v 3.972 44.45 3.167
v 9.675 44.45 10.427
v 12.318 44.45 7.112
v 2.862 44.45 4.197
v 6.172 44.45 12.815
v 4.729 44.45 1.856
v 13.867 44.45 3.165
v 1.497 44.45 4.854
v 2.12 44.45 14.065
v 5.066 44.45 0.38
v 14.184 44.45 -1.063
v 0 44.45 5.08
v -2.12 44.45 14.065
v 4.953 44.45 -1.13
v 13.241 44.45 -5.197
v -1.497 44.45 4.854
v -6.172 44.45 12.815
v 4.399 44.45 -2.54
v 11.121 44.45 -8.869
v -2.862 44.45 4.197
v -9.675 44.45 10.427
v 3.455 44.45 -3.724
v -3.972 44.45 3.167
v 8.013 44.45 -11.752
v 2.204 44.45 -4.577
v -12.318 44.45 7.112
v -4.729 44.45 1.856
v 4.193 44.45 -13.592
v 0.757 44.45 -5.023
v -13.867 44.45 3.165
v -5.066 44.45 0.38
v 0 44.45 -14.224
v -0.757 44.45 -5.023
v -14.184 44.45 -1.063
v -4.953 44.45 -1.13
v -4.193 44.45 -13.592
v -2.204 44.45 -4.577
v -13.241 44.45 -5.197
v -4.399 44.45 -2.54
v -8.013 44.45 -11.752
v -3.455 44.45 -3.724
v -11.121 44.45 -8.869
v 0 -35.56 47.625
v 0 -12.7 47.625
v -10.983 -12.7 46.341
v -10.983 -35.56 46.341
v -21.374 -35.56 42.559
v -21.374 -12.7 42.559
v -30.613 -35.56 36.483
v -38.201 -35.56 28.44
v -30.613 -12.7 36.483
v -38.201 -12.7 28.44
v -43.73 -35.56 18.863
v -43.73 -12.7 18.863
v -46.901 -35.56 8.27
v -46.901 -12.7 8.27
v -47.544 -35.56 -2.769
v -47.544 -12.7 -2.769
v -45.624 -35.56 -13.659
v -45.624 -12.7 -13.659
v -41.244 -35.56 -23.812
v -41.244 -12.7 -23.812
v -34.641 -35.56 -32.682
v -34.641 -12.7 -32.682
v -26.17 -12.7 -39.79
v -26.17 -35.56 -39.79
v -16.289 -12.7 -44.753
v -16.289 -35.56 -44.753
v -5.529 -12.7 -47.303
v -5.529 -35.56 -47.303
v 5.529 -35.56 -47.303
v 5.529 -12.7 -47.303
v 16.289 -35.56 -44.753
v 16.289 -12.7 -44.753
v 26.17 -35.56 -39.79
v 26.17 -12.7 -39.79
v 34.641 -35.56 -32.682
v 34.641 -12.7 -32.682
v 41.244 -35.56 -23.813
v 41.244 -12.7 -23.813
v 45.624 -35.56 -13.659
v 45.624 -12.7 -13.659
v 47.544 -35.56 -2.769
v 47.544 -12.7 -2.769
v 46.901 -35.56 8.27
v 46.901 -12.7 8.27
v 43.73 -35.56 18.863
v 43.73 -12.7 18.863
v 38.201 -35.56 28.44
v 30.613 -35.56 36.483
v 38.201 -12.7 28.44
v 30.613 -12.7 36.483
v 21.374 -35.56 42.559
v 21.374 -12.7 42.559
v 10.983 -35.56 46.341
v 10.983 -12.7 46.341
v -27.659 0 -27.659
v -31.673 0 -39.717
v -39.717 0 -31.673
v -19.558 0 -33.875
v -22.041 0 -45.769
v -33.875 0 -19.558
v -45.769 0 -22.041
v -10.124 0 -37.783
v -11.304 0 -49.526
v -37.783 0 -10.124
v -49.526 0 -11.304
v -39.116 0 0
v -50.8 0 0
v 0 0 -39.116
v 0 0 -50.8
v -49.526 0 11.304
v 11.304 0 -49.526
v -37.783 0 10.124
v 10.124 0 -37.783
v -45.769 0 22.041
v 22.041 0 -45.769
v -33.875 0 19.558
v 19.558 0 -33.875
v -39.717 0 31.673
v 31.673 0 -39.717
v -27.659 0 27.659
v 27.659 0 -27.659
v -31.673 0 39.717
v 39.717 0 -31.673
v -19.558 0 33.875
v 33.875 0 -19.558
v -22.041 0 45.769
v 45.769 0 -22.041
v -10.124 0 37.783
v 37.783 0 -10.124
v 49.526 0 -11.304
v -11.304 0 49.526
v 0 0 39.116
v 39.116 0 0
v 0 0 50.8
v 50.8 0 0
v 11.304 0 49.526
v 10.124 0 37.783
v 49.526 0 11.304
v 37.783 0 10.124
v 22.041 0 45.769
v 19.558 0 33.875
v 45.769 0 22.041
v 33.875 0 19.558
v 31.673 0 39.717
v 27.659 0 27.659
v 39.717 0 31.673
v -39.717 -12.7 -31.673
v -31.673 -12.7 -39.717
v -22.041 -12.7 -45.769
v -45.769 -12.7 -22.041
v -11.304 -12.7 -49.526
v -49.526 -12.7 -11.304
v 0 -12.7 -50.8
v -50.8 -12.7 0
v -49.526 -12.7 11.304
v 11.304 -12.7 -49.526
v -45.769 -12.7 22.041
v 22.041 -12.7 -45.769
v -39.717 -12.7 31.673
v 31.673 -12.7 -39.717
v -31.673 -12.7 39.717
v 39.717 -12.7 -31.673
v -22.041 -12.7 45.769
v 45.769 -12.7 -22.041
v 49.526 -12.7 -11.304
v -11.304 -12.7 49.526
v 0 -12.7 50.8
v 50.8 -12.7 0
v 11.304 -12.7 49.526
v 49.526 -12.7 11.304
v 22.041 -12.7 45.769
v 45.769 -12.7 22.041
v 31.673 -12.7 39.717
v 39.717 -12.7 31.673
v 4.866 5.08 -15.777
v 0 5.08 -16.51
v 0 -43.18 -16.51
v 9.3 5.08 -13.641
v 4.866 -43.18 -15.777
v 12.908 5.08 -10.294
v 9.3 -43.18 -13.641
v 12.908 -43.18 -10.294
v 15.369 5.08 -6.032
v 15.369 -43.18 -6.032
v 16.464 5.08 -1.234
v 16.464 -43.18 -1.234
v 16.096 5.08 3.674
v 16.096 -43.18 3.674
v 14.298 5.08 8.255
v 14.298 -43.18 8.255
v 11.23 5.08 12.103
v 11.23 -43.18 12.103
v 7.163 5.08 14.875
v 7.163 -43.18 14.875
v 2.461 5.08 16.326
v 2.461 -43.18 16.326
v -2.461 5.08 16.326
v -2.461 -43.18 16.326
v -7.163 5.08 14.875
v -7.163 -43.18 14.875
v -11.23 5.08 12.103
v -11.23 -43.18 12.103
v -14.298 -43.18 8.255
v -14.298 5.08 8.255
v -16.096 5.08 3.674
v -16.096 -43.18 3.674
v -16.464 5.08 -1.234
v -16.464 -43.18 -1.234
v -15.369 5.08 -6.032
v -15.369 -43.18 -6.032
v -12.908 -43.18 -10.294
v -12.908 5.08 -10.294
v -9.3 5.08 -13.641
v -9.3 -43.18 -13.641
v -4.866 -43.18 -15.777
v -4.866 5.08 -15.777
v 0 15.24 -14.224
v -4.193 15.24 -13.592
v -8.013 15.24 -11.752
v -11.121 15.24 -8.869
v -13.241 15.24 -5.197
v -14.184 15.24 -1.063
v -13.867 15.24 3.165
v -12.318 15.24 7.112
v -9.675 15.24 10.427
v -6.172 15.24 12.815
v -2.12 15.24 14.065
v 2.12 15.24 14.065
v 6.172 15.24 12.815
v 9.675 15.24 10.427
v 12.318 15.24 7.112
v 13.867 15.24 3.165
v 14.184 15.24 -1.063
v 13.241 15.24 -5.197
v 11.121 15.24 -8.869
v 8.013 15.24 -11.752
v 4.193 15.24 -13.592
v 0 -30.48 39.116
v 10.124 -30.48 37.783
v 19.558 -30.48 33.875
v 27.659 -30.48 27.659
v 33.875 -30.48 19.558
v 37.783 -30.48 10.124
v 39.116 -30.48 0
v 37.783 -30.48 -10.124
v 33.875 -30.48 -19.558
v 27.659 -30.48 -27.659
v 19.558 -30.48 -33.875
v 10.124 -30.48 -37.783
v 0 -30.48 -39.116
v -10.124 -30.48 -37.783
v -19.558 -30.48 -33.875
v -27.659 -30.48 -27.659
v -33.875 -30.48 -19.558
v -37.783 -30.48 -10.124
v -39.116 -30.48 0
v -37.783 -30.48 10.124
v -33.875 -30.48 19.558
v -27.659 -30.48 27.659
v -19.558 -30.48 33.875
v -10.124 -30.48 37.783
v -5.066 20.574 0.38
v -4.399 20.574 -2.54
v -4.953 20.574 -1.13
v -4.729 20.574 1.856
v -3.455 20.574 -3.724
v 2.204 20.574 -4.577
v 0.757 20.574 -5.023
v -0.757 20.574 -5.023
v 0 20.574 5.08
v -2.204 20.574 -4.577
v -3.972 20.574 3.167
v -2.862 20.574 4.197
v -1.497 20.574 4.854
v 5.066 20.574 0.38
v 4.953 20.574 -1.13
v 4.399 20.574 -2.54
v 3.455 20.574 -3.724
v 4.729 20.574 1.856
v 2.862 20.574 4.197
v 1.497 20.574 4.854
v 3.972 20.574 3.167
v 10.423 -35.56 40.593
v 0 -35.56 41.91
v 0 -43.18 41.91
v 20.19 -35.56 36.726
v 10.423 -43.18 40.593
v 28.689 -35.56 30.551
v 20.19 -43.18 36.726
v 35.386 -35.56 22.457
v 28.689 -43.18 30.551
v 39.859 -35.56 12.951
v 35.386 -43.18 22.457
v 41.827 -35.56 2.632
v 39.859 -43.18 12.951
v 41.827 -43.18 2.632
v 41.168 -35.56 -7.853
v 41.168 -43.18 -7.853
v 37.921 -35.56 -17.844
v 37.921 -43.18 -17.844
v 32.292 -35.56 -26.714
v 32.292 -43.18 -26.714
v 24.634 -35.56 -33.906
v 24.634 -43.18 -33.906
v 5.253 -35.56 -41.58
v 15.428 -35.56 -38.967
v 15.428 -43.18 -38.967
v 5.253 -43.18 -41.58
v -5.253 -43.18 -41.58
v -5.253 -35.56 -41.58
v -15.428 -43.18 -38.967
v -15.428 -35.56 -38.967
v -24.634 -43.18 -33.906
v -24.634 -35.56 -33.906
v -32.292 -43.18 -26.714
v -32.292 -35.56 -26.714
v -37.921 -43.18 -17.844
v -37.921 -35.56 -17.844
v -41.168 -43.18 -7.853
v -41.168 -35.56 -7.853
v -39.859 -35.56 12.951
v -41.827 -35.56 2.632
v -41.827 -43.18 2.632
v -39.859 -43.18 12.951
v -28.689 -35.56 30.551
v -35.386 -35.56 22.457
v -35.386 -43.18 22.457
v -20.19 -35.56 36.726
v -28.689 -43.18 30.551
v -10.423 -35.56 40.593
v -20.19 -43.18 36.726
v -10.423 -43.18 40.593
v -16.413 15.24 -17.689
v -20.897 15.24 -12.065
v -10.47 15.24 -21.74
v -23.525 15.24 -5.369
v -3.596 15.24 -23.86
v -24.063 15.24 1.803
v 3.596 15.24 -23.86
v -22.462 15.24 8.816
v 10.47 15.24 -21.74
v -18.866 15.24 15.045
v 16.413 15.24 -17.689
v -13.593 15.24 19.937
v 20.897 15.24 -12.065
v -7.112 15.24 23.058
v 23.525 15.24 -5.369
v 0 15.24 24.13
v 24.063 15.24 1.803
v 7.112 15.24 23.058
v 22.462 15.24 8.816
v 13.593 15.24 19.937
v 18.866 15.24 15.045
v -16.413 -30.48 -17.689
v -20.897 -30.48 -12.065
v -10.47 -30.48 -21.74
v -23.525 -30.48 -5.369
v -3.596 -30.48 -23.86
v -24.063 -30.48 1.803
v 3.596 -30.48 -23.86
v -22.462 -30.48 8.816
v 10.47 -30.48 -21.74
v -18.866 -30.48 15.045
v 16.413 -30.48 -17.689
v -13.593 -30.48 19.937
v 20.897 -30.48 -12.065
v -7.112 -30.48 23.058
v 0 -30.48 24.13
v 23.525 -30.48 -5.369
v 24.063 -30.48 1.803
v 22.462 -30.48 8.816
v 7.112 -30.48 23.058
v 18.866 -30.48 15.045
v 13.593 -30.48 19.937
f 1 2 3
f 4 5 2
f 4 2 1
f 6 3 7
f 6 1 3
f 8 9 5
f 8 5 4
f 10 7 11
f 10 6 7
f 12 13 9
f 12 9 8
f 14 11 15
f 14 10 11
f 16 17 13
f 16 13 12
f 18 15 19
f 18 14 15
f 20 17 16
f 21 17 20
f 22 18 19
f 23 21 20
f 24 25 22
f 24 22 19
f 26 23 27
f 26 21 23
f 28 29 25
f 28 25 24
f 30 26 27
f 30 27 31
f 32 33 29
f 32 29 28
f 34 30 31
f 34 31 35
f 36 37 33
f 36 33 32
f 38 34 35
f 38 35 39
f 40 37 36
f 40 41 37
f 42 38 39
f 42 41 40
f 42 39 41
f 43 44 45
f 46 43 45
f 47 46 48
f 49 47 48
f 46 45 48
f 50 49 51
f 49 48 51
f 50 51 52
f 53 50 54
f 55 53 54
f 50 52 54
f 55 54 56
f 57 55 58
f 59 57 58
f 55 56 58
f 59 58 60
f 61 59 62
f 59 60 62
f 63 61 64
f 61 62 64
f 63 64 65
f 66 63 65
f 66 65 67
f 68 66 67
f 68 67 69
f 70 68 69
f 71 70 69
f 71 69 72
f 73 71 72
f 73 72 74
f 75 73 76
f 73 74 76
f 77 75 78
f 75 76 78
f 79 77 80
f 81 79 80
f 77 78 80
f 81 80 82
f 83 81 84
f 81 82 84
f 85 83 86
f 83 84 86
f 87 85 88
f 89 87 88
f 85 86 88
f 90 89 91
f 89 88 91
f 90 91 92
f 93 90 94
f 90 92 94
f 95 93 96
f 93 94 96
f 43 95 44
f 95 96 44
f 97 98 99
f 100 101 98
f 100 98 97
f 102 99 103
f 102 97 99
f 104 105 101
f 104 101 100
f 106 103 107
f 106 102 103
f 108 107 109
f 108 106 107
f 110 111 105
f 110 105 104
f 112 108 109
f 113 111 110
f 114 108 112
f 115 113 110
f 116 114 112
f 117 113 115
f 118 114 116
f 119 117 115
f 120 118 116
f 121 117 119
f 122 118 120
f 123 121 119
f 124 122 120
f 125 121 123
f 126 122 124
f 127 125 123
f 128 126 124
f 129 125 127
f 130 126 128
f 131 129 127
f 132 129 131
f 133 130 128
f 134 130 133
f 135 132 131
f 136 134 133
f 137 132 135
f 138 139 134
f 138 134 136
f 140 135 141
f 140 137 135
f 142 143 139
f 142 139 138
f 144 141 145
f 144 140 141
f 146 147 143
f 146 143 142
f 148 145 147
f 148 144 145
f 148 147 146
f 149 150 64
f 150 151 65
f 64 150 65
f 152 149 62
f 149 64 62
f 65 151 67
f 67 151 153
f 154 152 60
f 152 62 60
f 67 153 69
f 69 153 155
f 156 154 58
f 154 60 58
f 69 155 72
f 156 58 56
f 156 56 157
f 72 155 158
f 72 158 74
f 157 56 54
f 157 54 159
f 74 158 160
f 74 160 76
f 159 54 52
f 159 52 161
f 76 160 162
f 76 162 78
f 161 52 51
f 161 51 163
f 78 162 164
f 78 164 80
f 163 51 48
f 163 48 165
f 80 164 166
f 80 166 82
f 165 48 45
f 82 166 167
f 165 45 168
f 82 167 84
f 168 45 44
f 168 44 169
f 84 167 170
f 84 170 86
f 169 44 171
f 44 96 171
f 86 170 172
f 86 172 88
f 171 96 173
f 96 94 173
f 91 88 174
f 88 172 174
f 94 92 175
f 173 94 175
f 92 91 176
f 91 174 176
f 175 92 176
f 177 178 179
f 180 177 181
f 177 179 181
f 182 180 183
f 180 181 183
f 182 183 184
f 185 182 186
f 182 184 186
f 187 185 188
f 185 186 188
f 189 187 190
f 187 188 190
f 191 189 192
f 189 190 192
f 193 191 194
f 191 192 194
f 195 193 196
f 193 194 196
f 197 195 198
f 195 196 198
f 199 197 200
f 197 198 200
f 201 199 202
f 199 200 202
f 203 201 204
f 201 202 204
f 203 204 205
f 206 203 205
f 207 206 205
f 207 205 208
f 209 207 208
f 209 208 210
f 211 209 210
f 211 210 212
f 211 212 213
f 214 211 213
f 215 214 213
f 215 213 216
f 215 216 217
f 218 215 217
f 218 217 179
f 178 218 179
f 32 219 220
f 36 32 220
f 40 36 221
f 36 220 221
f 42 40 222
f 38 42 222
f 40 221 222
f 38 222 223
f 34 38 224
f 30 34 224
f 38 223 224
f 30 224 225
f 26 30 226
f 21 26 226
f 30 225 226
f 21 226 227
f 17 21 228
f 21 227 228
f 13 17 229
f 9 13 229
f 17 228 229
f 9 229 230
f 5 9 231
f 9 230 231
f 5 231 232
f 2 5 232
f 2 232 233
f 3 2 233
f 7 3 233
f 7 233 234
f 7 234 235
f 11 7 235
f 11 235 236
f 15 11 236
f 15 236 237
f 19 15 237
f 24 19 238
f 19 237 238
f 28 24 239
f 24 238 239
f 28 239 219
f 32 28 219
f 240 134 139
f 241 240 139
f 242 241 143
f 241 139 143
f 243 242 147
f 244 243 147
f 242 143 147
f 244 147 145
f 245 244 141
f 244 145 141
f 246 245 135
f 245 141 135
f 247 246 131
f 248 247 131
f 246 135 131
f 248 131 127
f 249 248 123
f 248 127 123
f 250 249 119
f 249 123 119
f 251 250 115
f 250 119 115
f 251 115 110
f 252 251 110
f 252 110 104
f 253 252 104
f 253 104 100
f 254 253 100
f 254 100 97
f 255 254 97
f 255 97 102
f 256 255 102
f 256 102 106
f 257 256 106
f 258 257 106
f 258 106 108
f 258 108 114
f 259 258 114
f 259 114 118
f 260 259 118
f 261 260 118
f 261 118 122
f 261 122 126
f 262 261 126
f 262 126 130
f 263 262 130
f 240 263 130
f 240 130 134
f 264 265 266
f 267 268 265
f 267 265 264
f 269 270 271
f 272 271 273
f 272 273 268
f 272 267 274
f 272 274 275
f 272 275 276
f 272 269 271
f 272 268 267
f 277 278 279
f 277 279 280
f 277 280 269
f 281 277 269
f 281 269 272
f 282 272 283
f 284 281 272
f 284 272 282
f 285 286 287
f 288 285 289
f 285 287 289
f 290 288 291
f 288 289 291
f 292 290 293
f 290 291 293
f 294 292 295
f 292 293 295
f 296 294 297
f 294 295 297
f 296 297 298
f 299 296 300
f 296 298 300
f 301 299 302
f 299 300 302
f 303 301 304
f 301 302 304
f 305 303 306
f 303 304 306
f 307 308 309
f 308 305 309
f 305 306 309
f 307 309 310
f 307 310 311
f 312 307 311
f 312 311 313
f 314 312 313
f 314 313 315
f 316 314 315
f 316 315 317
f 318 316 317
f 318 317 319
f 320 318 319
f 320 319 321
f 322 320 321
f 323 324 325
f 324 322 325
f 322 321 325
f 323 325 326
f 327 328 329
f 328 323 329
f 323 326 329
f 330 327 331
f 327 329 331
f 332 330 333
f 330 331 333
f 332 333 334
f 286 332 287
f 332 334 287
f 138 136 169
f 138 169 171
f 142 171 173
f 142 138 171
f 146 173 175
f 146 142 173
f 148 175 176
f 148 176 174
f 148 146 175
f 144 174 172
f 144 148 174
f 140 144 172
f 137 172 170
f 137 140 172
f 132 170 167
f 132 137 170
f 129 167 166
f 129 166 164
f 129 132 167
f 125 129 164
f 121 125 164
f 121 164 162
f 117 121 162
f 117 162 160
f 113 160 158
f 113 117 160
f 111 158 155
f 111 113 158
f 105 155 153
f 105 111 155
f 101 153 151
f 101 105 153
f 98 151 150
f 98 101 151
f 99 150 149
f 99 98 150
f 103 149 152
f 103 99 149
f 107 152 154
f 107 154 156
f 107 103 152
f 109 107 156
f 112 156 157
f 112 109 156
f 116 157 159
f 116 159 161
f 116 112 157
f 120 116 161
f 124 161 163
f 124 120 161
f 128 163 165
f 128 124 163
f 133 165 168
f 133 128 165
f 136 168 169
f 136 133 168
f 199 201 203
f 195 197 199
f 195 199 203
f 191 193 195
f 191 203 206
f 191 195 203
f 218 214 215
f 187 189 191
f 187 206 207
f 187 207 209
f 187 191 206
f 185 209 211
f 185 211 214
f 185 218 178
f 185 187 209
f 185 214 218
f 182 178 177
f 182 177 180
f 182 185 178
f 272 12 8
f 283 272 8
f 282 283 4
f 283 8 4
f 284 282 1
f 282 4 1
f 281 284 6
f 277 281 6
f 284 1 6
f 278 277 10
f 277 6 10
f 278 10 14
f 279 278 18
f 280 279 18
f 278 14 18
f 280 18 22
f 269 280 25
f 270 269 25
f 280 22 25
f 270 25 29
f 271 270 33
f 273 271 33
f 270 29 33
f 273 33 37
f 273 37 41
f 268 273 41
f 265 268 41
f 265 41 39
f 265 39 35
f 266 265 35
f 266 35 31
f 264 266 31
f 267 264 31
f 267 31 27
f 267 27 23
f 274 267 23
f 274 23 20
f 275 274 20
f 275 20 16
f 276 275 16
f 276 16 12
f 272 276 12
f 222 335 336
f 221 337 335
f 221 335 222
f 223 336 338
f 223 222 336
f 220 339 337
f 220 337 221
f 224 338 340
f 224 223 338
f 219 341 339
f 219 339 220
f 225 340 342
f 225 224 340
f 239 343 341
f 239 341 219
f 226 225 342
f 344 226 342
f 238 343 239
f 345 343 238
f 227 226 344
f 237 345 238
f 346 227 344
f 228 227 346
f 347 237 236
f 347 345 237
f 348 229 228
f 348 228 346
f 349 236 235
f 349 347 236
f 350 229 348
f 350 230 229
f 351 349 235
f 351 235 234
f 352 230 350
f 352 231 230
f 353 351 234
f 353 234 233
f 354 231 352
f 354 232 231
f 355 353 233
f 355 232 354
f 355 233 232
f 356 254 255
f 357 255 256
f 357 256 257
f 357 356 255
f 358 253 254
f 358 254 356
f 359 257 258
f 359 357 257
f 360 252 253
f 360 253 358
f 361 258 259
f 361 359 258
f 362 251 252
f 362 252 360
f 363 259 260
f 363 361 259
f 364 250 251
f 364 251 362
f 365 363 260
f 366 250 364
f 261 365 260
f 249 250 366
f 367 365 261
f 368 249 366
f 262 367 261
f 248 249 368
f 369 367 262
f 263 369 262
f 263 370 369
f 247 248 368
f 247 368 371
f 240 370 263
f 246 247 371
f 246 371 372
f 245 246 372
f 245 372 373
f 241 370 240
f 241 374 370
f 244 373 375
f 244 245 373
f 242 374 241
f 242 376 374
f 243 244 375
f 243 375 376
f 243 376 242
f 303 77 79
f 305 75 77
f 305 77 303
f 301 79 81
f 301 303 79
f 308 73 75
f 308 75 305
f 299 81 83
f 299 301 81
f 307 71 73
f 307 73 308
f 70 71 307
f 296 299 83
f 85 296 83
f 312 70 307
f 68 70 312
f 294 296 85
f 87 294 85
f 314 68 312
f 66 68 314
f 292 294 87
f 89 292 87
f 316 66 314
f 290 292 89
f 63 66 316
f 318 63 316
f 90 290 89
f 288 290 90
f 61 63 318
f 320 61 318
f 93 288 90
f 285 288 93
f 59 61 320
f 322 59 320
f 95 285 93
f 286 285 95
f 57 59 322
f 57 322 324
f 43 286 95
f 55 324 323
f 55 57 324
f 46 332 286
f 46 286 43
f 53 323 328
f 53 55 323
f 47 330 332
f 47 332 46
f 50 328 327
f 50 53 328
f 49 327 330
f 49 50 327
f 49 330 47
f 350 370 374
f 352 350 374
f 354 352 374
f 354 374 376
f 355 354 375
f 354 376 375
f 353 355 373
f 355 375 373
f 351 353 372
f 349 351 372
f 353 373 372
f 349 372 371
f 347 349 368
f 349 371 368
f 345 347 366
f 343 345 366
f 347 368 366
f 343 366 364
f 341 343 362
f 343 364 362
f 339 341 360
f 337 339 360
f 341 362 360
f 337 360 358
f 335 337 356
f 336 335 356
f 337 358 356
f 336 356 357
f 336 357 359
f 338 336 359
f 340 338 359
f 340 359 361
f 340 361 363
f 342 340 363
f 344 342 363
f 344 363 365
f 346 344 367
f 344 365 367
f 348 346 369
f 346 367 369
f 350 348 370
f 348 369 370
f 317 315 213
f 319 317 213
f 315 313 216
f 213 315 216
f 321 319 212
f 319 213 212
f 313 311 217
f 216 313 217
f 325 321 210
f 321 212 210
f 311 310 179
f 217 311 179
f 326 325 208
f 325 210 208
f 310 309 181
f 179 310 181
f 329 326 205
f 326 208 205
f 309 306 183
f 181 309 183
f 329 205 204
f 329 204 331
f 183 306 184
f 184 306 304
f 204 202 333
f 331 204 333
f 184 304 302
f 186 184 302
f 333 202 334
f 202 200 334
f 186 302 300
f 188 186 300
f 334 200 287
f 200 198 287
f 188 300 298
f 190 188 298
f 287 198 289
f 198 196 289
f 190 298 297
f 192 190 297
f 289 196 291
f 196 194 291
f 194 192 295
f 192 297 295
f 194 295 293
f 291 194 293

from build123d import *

# Parameters (mm, degrees)
SKETCH1_R                = 50.8
SKETCH1_R_2              = 39.116
BOSS_EXTRUDE1_DEPTH      = 12.7
BOSS_EXTRUDE2_DEPTH      = 20.32
BOSS_EXTRUDE2_DEPTH_BACK = 2.54
SKETCH2_R                = 47.625
SKETCH2_R_2              = 39.116
BOSS_EXTRUDE3_DEPTH      = 7.62
BOSS_EXTRUDE3_DEPTH_BACK = 5.08
SKETCH4_R                = 41.91
BOSS_EXTRUDE4_START      = -2.54
SKETCH5_R                = 24.13
BOSS_EXTRUDE4_DEPTH      = 45.72
BOSS_EXTRUDE5_START      = -2.54
SKETCH6_R                = 14.224
BOSS_EXTRUDE5_DEPTH      = 29.21
SKETCH7_R                = 16.51
CUT_EXTRUDE1_DEPTH       = 50.8
SKETCH8_R                = 5.08
CUT_EXTRUDE2_DEPTH       = 26.416


with BuildPart() as part:
    # Sketch1 → Boss-Extrude1 (new body)
    with BuildSketch(Plane(origin=(0, 0, 0), x_dir=(1, 0, 0), z_dir=(0, 1, 0))):
        with Locations(Location((0, 0, 0), (0, 0, 270))):
            Circle(SKETCH1_R)
        with Locations(Location((0, 0, 0), (0, 0, 270))):
            Circle(SKETCH1_R_2, mode=Mode.SUBTRACT)
    extrude(amount=-BOSS_EXTRUDE1_DEPTH)



with BuildPart() as body_2:
    # Sketch2 → Boss-Extrude2 (new, two sides: drawn at the far end of the back side and taken through both)
    with BuildSketch(Plane(origin=(0, -15.24, 0), x_dir=(-1, 0, 0), z_dir=(0, -1, 0)).offset(-BOSS_EXTRUDE2_DEPTH_BACK)):
        with Locations(Location((0, 0, 0), (0, 0, 270))):
            Circle(SKETCH2_R)
        with Locations(Location((0, 0, 0), (0, 0, 270))):
            Circle(SKETCH2_R_2, mode=Mode.SUBTRACT)
    extrude(amount=BOSS_EXTRUDE2_DEPTH + BOSS_EXTRUDE2_DEPTH_BACK)

    # Sketch4 → Boss-Extrude3 (add, two sides: drawn at the far end of the back side and taken through both)
    with BuildSketch(Plane(origin=(0, -38.1, 0), x_dir=(1, 0, 0), z_dir=(0, 1, 0)).offset(-BOSS_EXTRUDE3_DEPTH_BACK)):
        with Locations(Location((0, 0, 0), (0, 0, 270))):
            Circle(SKETCH4_R)
    extrude(amount=BOSS_EXTRUDE3_DEPTH + BOSS_EXTRUDE3_DEPTH_BACK)


with BuildPart() as part_1:
    add(part.part)

    add(body_2.part)  # Boss-Extrude4 merges body 2
    # Sketch5 → Boss-Extrude4 (add)
    with BuildSketch(Plane(origin=(0, -27.94, 0), x_dir=(1, 0, 0), z_dir=(0, 1, 0)).offset(BOSS_EXTRUDE4_START)):
        with Locations(Location((0, 0, 0), (0, 0, 270))):
            Circle(SKETCH5_R)
    extrude(amount=BOSS_EXTRUDE4_DEPTH)

    # Sketch6 → Boss-Extrude5 (add)
    with BuildSketch(Plane(origin=(0, 17.78, 0), x_dir=(1, 0, 0), z_dir=(0, 1, 0)).offset(BOSS_EXTRUDE5_START)):
        with Locations(Location((0, 0, 0), (0, 0, 90))):
            Circle(SKETCH6_R)
    extrude(amount=BOSS_EXTRUDE5_DEPTH)

    # Sketch7 → Cut-Extrude1 (cut)
    with BuildSketch(Plane(origin=(0, -45.72, 0), x_dir=(-1, 0, 0), z_dir=(0, -1, 0))):
        with Locations(Location((0, 0, 0), (0, 0, 90))):
            Circle(SKETCH7_R)
    extrude(amount=-CUT_EXTRUDE1_DEPTH, mode=Mode.SUBTRACT)

    # Sketch8 → Cut-Extrude2 (cut)
    with BuildSketch(Plane(origin=(0, 46.99, 0), x_dir=(1, 0, 0), z_dir=(0, 1, 0))):
        with Locations(Location((0, 0, 0), (0, 0, 270))):
            Circle(SKETCH8_R)
    extrude(amount=-CUT_EXTRUDE2_DEPTH, mode=Mode.SUBTRACT)


solid = part_1.part
